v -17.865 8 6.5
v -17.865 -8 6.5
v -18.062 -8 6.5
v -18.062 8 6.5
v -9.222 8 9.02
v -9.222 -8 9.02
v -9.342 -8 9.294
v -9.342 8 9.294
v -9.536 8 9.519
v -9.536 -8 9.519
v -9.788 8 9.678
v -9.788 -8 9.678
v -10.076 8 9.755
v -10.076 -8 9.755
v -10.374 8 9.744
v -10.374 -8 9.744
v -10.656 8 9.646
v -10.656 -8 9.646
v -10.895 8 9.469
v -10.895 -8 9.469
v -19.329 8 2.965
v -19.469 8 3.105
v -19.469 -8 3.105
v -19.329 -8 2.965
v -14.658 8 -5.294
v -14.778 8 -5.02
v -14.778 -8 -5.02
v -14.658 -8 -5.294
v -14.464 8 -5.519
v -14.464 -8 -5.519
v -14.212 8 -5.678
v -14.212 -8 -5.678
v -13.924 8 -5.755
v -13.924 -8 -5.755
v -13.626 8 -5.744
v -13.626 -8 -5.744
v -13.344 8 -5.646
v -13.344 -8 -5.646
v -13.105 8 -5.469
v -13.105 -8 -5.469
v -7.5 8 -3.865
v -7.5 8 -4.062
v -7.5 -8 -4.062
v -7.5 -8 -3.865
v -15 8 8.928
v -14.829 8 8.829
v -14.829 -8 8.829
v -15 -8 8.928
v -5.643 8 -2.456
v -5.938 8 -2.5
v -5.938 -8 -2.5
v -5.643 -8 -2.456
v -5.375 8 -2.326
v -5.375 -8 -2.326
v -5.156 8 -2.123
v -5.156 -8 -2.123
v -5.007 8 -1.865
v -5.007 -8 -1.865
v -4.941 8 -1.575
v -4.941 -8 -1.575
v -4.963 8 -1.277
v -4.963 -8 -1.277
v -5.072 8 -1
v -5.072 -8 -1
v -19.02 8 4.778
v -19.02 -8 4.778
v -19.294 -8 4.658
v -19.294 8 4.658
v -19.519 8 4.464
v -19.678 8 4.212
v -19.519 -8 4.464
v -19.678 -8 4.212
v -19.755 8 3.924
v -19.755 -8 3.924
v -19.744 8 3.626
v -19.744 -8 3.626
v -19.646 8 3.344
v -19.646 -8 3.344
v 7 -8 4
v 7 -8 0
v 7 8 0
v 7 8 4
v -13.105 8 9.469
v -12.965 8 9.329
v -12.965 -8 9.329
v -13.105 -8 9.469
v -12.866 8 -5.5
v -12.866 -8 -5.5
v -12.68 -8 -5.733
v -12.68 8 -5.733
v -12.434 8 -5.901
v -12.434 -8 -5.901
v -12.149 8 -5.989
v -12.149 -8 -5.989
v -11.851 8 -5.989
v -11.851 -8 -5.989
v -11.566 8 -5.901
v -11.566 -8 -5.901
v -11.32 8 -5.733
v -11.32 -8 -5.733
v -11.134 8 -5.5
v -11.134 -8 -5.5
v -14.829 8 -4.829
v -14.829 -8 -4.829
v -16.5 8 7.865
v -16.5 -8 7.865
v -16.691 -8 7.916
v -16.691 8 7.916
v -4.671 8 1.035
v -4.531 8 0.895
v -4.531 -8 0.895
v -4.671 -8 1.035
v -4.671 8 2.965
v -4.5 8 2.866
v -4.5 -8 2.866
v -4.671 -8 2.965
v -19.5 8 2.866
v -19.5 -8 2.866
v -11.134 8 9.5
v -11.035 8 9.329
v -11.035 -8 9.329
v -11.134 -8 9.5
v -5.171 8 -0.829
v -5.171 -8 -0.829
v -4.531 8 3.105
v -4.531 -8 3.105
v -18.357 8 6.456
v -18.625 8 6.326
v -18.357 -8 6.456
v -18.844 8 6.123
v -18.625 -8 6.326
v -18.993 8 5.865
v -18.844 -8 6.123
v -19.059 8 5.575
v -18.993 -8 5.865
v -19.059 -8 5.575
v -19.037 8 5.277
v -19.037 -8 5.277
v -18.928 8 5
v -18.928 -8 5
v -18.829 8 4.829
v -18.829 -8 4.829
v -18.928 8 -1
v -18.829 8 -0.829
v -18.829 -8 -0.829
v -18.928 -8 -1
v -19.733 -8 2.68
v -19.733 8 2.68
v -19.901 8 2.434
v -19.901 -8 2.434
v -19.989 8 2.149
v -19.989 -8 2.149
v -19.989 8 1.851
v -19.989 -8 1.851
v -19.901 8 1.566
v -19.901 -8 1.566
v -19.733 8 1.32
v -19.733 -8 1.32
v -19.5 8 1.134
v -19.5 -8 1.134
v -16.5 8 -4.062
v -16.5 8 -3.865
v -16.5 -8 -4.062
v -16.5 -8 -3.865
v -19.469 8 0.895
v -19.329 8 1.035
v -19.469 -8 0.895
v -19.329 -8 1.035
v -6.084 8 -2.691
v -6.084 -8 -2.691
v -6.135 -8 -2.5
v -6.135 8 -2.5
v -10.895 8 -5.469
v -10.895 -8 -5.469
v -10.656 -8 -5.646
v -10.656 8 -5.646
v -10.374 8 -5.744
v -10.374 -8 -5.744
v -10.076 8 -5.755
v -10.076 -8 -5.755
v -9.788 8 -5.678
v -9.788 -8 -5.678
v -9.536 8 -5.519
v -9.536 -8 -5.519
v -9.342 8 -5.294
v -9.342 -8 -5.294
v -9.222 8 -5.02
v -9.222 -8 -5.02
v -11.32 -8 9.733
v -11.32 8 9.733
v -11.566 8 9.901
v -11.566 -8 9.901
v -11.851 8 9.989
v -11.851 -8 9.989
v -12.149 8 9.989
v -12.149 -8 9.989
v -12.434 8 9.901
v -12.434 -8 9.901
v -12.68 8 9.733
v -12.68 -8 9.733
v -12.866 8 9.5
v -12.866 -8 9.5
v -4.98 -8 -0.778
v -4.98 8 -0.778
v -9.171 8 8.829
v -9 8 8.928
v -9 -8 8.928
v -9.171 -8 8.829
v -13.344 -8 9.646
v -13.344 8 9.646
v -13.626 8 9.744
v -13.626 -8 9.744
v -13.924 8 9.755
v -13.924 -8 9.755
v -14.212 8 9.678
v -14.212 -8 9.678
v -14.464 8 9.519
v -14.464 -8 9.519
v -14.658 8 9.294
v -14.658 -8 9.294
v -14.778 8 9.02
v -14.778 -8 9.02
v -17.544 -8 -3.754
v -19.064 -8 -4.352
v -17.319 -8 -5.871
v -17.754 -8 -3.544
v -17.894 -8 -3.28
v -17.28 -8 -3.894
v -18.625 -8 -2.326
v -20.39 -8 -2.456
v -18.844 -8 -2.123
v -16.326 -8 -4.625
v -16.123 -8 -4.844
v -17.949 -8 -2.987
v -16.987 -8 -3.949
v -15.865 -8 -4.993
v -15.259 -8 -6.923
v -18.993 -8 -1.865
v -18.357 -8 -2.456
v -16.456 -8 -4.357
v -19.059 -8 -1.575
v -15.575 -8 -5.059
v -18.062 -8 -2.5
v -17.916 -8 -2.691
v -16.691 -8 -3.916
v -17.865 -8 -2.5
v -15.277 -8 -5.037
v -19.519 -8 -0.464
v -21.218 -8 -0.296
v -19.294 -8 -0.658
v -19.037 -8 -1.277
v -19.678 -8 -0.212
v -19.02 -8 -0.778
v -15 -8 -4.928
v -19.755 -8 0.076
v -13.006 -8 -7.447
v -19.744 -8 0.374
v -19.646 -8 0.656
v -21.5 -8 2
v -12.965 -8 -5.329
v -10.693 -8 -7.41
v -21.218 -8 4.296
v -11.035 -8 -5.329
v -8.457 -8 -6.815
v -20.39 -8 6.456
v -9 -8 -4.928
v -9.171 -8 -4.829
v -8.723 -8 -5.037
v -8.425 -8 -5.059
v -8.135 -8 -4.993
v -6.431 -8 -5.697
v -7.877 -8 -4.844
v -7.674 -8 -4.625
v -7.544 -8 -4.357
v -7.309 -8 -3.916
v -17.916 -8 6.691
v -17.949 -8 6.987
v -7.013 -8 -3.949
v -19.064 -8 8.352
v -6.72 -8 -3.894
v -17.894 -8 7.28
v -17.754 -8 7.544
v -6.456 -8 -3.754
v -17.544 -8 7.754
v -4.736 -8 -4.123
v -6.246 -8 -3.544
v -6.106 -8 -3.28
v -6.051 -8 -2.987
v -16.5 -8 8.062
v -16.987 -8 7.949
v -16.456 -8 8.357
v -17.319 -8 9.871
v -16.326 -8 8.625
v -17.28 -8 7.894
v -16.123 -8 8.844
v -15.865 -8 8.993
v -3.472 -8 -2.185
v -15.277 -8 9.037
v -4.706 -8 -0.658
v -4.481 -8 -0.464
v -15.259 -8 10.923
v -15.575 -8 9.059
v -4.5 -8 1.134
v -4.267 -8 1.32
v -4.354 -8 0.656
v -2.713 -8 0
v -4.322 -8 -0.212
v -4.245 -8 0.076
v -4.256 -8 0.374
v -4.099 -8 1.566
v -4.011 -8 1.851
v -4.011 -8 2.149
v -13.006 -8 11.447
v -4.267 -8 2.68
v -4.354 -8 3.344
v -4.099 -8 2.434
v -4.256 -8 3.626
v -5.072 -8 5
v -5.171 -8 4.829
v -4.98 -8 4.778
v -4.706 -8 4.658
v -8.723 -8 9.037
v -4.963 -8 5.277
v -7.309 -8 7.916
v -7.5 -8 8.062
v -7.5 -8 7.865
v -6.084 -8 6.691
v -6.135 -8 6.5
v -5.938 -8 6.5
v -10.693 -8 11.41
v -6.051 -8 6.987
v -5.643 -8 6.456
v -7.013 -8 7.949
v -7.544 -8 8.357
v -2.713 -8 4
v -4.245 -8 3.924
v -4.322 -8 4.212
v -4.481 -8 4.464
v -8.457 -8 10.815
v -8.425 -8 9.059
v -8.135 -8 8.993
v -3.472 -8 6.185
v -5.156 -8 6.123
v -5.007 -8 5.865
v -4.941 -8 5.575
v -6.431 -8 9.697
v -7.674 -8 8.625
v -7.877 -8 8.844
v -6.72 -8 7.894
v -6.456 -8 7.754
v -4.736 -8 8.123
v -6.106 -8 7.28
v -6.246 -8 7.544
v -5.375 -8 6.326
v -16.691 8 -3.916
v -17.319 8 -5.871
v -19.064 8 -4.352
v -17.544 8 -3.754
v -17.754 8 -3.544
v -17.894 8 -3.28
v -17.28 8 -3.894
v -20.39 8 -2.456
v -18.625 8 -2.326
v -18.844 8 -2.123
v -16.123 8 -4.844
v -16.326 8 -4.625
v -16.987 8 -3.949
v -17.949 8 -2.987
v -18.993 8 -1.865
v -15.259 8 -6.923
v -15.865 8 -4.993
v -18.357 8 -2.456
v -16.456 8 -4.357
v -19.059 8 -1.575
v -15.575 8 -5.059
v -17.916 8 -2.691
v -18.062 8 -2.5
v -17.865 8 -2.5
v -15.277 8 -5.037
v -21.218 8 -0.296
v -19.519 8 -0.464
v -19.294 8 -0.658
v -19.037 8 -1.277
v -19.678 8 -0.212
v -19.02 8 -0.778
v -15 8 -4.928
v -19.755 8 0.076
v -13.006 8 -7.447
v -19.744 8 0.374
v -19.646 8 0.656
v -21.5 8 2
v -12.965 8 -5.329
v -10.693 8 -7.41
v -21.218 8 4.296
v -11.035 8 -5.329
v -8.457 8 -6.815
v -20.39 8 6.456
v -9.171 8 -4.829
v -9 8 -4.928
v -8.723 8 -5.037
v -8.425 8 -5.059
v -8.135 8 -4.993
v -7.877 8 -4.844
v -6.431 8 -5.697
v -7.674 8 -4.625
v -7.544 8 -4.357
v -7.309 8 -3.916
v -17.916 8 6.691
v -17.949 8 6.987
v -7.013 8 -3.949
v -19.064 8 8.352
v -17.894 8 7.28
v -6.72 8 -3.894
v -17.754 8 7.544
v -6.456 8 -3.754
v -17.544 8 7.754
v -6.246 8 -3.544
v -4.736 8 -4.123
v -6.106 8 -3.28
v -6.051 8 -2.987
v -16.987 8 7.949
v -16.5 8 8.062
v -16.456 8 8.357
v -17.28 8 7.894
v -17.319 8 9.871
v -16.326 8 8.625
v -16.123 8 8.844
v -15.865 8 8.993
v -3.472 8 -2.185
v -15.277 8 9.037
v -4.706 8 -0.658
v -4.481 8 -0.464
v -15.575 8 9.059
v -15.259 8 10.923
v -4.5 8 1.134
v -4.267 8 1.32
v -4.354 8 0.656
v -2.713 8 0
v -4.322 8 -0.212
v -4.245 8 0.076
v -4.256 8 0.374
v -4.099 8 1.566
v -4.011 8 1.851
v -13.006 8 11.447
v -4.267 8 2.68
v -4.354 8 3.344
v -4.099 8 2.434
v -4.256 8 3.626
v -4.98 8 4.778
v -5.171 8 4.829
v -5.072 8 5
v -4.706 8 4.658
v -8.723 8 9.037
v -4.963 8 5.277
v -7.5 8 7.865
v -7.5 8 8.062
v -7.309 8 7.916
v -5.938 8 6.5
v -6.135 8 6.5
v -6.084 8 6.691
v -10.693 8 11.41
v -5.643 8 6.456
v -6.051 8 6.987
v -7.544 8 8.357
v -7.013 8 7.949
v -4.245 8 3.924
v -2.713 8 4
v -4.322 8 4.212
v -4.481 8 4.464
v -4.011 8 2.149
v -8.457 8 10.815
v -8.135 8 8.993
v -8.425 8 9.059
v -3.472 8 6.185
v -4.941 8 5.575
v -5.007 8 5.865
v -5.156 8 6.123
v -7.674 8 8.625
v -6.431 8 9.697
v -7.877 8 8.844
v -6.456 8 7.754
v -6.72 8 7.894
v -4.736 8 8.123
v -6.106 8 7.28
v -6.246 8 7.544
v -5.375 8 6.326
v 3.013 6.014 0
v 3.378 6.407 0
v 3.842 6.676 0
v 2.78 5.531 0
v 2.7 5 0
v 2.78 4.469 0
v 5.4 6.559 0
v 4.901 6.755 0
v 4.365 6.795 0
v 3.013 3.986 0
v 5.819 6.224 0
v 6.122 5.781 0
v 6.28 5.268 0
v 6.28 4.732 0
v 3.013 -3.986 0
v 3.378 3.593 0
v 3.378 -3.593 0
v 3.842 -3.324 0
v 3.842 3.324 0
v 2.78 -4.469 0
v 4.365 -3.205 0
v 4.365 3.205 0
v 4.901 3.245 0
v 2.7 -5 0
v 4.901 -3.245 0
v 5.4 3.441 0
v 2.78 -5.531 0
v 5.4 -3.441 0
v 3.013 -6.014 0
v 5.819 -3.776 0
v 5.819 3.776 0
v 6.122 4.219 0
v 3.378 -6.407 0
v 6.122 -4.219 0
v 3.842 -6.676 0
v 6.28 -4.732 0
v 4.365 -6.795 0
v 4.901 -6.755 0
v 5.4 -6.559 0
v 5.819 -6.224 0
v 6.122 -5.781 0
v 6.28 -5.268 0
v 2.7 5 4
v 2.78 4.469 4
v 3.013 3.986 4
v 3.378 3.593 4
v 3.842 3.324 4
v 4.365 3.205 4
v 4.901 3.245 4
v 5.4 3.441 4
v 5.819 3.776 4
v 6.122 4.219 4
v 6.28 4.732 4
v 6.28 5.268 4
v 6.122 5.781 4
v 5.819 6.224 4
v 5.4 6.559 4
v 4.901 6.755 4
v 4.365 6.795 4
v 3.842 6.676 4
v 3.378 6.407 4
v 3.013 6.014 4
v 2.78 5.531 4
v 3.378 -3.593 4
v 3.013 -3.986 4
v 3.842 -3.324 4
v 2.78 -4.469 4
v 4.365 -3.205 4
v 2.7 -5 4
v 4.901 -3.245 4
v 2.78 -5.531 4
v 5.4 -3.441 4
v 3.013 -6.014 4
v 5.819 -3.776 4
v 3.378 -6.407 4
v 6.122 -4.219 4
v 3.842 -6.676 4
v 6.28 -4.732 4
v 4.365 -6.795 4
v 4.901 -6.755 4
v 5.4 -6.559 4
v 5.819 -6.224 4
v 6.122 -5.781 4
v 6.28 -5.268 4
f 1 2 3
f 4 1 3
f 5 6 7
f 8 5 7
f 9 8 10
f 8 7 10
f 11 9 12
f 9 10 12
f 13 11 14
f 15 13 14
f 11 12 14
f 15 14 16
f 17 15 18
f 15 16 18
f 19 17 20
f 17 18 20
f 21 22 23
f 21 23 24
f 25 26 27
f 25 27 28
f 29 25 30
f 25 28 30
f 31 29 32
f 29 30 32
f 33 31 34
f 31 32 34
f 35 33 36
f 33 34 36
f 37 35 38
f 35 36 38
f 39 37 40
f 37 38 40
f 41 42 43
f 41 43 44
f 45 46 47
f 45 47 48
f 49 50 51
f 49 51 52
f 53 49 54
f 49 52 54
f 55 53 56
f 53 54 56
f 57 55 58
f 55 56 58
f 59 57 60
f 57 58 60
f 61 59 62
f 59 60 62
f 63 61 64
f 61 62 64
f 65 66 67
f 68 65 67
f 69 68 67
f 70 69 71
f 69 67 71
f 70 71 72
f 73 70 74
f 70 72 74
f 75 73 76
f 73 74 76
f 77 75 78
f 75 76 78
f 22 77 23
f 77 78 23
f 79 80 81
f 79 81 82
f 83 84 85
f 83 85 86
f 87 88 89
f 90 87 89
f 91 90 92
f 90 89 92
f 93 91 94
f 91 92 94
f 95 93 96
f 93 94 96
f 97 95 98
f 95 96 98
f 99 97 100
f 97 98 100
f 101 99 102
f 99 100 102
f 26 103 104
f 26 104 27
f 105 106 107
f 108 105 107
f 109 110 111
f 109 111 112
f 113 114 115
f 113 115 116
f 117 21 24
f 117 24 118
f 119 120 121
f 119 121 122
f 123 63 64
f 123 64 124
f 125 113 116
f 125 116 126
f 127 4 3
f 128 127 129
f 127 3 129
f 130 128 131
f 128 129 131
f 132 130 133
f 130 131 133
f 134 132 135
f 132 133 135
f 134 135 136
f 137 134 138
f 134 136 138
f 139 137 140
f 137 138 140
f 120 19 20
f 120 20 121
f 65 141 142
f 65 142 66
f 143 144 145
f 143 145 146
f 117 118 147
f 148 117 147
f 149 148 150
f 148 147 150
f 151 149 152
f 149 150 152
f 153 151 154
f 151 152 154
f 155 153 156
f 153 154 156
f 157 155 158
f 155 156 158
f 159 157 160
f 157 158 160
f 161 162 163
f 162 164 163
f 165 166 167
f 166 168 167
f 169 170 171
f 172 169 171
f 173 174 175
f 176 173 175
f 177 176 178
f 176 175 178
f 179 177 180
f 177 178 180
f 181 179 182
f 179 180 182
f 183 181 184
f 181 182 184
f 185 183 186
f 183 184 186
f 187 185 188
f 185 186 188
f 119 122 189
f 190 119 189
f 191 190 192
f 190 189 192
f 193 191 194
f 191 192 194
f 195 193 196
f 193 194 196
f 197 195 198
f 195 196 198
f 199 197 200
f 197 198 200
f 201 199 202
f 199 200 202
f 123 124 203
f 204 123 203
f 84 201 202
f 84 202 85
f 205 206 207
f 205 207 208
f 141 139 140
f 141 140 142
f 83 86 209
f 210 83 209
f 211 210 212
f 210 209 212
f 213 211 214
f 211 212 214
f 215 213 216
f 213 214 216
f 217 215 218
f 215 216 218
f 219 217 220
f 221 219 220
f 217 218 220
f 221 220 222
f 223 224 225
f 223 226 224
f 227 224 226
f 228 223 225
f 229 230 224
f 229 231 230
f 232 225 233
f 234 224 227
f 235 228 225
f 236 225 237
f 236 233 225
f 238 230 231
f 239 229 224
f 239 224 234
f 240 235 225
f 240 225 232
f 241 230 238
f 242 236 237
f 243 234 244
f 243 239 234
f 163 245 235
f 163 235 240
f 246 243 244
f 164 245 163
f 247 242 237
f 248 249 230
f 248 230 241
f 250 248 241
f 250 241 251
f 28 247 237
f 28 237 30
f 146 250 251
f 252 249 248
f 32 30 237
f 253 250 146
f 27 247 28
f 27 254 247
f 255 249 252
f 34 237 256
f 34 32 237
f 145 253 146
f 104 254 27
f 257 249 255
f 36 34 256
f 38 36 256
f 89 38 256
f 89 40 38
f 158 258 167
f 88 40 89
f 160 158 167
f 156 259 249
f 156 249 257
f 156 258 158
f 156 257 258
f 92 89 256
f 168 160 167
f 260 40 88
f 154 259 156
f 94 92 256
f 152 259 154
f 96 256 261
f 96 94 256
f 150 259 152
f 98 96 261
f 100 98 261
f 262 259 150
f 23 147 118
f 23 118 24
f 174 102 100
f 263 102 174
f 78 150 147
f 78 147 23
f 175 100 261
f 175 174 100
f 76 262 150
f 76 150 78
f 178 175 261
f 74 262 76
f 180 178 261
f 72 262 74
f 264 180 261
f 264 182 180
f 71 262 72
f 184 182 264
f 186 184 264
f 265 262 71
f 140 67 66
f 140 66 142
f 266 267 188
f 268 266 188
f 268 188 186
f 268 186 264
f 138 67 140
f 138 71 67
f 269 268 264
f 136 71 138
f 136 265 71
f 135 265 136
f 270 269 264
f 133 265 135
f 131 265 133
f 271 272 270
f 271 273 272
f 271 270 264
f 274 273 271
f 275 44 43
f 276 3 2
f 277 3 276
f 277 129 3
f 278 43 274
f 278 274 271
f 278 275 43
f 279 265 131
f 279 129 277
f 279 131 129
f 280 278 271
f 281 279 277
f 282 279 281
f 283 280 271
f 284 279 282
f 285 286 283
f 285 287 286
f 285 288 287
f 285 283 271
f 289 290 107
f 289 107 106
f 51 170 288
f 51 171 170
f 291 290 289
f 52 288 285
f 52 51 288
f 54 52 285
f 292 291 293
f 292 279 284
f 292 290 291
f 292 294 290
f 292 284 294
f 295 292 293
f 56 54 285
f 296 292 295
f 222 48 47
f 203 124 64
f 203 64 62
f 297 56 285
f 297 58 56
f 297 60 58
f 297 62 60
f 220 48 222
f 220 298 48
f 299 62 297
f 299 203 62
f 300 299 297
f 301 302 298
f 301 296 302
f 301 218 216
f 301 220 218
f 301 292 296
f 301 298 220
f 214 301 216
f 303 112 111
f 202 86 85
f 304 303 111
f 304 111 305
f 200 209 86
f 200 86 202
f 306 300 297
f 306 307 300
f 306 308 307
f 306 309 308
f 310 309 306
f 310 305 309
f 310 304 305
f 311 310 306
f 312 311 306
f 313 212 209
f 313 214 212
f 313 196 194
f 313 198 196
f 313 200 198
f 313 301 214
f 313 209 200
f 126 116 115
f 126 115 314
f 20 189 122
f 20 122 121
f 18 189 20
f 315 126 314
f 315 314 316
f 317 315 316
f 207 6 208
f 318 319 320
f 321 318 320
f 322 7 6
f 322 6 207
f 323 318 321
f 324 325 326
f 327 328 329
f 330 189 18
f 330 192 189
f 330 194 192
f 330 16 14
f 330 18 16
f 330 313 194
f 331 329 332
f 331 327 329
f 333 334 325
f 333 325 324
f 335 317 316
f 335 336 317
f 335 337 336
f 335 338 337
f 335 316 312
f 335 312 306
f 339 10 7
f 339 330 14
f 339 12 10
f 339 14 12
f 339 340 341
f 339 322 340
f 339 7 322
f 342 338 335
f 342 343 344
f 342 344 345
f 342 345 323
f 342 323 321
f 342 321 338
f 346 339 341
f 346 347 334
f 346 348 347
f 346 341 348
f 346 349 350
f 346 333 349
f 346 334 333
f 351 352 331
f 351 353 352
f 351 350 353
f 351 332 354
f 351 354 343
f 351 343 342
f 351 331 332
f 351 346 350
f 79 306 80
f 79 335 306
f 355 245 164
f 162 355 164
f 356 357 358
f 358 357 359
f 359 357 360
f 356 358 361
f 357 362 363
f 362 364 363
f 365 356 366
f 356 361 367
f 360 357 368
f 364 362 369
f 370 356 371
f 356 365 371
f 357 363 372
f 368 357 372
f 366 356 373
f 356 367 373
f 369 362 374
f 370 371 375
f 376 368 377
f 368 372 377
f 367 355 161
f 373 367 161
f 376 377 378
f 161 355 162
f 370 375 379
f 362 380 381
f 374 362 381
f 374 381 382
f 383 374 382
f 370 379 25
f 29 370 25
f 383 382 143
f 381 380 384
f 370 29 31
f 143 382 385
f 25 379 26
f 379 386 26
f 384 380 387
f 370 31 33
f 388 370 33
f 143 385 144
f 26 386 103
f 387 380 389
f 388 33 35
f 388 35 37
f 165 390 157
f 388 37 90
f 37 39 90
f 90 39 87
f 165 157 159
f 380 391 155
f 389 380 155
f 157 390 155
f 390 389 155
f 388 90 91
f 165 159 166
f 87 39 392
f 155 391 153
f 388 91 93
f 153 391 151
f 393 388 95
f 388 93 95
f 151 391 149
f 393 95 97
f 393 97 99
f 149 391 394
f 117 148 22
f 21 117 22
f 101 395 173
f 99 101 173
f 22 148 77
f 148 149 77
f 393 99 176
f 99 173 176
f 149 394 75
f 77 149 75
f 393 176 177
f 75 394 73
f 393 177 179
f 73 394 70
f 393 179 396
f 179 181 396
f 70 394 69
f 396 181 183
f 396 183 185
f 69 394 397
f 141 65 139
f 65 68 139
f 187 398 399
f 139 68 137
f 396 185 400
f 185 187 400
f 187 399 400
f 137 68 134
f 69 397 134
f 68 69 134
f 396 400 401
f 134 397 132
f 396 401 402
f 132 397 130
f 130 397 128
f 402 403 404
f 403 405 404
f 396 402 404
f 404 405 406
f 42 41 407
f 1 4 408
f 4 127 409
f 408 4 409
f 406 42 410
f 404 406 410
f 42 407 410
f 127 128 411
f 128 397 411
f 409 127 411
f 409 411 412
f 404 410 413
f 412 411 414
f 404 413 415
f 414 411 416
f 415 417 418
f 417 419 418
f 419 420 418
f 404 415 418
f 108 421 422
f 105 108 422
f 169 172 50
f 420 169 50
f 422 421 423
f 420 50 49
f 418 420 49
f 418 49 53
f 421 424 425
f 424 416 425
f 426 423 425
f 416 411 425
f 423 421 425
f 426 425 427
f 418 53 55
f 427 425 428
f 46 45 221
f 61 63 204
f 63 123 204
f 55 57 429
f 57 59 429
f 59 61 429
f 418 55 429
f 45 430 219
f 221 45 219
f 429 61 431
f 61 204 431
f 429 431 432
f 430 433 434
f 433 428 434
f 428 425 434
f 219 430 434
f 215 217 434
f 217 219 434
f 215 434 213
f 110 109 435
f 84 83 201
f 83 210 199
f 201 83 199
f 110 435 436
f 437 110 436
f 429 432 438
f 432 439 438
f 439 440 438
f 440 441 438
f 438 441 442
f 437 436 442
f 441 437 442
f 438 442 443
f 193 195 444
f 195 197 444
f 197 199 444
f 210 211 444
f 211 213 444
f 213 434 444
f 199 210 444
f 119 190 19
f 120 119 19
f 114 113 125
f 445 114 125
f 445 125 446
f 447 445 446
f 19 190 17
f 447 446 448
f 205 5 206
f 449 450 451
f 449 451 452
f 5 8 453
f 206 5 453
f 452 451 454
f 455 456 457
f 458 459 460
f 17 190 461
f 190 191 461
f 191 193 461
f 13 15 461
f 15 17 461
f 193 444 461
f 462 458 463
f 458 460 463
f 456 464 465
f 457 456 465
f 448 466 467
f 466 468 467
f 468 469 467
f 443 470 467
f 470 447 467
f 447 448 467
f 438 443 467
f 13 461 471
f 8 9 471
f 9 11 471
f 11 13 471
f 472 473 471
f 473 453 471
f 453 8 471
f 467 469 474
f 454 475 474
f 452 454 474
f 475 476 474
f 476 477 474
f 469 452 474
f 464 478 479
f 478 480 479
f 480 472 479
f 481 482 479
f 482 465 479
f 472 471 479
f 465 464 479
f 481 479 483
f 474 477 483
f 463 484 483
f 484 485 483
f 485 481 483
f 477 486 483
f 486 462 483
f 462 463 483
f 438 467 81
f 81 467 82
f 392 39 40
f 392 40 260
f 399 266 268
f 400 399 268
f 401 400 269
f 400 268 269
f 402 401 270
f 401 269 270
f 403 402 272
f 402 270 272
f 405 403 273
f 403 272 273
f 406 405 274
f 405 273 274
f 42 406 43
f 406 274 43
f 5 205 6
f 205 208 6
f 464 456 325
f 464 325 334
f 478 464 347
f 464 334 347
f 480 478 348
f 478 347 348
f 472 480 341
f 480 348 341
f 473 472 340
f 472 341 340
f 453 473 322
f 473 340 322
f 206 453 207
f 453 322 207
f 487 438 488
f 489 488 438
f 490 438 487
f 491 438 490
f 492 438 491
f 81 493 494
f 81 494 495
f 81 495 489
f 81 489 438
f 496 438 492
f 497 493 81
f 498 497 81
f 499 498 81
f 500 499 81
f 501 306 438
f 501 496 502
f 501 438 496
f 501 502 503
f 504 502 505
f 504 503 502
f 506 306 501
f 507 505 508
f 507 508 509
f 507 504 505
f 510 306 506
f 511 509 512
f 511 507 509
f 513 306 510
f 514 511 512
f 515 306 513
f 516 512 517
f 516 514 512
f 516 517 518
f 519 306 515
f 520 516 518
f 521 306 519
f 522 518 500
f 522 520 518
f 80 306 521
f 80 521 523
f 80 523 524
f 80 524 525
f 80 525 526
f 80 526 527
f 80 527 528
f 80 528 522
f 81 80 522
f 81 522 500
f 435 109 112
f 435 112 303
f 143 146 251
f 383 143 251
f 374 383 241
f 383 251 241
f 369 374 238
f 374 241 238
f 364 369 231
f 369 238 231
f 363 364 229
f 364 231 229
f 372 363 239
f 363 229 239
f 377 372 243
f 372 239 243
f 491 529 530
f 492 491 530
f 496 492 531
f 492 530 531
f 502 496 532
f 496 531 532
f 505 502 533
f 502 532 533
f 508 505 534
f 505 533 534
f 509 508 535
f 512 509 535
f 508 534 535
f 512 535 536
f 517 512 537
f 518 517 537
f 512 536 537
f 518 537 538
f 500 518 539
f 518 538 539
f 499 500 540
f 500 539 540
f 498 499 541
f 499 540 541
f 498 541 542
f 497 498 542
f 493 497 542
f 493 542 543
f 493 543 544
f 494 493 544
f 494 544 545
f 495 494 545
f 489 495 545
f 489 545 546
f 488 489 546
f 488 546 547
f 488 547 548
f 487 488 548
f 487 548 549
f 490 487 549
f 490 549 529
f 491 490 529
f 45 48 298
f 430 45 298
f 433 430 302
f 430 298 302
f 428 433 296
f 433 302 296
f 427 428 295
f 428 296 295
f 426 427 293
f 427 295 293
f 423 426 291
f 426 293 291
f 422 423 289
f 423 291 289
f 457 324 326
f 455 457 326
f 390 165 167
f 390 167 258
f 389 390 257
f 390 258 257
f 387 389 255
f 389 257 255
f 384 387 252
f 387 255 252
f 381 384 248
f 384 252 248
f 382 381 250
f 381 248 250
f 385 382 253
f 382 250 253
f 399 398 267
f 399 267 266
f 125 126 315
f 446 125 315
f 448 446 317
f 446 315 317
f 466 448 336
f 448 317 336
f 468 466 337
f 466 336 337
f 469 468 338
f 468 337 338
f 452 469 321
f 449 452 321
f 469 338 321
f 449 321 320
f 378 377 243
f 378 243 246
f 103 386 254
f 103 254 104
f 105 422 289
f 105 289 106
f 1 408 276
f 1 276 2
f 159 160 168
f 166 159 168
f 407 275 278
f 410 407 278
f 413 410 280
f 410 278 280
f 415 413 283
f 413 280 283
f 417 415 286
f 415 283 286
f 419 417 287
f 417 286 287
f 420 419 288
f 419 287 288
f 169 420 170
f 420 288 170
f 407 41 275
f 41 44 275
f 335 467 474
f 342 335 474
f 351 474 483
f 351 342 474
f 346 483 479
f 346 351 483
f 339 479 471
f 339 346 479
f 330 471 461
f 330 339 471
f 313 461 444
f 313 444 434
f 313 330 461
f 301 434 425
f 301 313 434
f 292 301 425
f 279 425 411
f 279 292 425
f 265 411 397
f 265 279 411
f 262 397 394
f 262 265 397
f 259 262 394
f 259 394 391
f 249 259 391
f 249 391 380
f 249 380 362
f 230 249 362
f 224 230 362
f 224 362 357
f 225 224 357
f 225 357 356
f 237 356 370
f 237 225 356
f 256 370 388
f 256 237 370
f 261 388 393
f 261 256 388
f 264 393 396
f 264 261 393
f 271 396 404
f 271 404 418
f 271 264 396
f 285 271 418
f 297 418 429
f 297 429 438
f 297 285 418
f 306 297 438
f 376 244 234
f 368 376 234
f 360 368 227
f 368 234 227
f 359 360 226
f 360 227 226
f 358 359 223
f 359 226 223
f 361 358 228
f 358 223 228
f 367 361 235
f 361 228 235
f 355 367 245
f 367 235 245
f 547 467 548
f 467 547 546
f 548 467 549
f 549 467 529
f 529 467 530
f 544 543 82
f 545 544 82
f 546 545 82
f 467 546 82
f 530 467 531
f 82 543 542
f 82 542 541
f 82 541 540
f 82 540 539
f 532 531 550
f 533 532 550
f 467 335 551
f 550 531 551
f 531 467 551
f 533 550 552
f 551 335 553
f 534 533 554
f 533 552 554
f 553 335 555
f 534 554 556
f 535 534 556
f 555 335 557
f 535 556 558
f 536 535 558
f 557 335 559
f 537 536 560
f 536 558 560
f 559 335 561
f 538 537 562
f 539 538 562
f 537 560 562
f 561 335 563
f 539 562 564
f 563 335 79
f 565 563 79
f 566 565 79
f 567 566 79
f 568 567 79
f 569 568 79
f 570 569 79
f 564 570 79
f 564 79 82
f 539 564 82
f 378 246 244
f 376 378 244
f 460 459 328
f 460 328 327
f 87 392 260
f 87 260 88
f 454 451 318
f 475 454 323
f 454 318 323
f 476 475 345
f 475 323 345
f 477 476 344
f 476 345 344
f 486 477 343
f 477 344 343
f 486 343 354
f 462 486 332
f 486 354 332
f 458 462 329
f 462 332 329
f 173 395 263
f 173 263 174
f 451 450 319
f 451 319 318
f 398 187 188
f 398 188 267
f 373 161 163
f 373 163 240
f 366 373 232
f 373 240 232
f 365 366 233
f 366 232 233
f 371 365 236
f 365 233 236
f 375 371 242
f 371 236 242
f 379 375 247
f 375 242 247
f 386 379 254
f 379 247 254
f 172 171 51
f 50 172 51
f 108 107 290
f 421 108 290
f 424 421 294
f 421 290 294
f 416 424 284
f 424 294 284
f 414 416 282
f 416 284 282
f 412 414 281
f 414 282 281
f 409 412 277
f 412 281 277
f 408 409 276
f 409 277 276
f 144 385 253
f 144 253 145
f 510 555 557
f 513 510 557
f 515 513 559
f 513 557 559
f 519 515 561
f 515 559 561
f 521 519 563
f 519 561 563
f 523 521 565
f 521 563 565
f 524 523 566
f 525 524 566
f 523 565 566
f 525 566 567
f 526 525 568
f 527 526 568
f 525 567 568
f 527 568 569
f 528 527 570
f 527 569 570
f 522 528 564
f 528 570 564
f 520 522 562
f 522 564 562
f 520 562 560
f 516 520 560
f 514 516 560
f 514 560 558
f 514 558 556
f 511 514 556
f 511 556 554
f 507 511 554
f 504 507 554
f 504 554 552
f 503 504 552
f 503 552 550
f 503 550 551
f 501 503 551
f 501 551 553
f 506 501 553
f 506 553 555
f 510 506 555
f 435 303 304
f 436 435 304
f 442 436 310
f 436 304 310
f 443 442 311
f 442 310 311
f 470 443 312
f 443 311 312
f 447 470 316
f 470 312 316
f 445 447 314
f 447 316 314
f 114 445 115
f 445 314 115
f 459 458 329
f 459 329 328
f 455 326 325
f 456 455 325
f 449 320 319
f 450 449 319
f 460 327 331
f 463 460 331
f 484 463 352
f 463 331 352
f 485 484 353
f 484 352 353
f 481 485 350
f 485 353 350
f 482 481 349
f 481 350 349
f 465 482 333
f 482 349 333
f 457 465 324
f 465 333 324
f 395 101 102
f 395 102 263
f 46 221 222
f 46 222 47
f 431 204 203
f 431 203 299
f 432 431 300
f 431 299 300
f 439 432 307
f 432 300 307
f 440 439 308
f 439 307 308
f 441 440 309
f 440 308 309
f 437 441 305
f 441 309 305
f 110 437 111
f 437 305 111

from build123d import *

# Parameters (mm, degrees)
SKETCH079_R          = 9.5
PAD028_DEPTH         = 8
POCKET026_DEPTH      = 70.546983
POCKET026_DEPTH_BACK = 70.546983
POLARPATTERN_COUNT   = 8
SKETCH081_W          = 10
SKETCH081_H          = 4
PAD030_DEPTH         = 8
SKETCH082_R          = 1.8
POCKET_DEPTH         = 11.501


with BuildPart() as part:
    # Sketch079 → Pad028 (new body, symmetric)
    with BuildSketch(Plane.XZ):
        Circle(SKETCH079_R)
    extrude(amount=PAD028_DEPTH, both=True)

    # Sketch078 → Pocket026 (cut, two sides)
    with BuildSketch(Plane.XZ) as pocket026_sk:
        with BuildLine():
            Line((0.866025, -7.5), (6.928203, 3))
            ThreePointArc((6.928203, 3), (6.928203, 4), (6.062178, 4.5))
            Line((6.062178, 4.5), (-6.062178, 4.5))
            ThreePointArc((-6.062178, 4.5), (-6.928203, 4), (-6.928203, 3))
            Line((-6.928203, 3), (-0.866025, -7.5))
            ThreePointArc((-0.866025, -7.5), (0, -8), (0.866025, -7.5))
        make_face()
    pocket026 = extrude(amount=-POCKET026_DEPTH, mode=Mode.SUBTRACT) + extrude(pocket026_sk.sketch, amount=POCKET026_DEPTH_BACK, mode=Mode.SUBTRACT)

    # PolarPattern: Pocket026 ×8 about axis
    polarpattern_axis = Axis((0, 0, 0), (0, 1, 0))
    for i in range(1, POLARPATTERN_COUNT):
        add(pocket026.rotate(polarpattern_axis, i * 360 / POLARPATTERN_COUNT), mode=Mode.SUBTRACT)

    # Sketch081 → Pad030 (join, symmetric)
    with BuildSketch(Plane.XZ):
        with Locations((14, 0)):
            Rectangle(SKETCH081_W, SKETCH081_H)
    extrude(amount=PAD030_DEPTH, both=True)

    # Sketch082 (on Face6 of Pad030) → Pocket (cut, through all)
    with BuildSketch(Plane(origin=(0, 0, 2), x_dir=(-1, 0, 0), z_dir=(0, 0, 1))):
        with Locations((-16.5, 5)):
            Circle(SKETCH082_R)
        with Locations((-16.5, -5)):
            Circle(SKETCH082_R)
    extrude(amount=-POCKET_DEPTH, mode=Mode.SUBTRACT)


with BuildPart() as part_1:
    # Body011 placement: moved
    add(part.part.moved(Location((-12, 0, 2))))


solid = part_1.part
